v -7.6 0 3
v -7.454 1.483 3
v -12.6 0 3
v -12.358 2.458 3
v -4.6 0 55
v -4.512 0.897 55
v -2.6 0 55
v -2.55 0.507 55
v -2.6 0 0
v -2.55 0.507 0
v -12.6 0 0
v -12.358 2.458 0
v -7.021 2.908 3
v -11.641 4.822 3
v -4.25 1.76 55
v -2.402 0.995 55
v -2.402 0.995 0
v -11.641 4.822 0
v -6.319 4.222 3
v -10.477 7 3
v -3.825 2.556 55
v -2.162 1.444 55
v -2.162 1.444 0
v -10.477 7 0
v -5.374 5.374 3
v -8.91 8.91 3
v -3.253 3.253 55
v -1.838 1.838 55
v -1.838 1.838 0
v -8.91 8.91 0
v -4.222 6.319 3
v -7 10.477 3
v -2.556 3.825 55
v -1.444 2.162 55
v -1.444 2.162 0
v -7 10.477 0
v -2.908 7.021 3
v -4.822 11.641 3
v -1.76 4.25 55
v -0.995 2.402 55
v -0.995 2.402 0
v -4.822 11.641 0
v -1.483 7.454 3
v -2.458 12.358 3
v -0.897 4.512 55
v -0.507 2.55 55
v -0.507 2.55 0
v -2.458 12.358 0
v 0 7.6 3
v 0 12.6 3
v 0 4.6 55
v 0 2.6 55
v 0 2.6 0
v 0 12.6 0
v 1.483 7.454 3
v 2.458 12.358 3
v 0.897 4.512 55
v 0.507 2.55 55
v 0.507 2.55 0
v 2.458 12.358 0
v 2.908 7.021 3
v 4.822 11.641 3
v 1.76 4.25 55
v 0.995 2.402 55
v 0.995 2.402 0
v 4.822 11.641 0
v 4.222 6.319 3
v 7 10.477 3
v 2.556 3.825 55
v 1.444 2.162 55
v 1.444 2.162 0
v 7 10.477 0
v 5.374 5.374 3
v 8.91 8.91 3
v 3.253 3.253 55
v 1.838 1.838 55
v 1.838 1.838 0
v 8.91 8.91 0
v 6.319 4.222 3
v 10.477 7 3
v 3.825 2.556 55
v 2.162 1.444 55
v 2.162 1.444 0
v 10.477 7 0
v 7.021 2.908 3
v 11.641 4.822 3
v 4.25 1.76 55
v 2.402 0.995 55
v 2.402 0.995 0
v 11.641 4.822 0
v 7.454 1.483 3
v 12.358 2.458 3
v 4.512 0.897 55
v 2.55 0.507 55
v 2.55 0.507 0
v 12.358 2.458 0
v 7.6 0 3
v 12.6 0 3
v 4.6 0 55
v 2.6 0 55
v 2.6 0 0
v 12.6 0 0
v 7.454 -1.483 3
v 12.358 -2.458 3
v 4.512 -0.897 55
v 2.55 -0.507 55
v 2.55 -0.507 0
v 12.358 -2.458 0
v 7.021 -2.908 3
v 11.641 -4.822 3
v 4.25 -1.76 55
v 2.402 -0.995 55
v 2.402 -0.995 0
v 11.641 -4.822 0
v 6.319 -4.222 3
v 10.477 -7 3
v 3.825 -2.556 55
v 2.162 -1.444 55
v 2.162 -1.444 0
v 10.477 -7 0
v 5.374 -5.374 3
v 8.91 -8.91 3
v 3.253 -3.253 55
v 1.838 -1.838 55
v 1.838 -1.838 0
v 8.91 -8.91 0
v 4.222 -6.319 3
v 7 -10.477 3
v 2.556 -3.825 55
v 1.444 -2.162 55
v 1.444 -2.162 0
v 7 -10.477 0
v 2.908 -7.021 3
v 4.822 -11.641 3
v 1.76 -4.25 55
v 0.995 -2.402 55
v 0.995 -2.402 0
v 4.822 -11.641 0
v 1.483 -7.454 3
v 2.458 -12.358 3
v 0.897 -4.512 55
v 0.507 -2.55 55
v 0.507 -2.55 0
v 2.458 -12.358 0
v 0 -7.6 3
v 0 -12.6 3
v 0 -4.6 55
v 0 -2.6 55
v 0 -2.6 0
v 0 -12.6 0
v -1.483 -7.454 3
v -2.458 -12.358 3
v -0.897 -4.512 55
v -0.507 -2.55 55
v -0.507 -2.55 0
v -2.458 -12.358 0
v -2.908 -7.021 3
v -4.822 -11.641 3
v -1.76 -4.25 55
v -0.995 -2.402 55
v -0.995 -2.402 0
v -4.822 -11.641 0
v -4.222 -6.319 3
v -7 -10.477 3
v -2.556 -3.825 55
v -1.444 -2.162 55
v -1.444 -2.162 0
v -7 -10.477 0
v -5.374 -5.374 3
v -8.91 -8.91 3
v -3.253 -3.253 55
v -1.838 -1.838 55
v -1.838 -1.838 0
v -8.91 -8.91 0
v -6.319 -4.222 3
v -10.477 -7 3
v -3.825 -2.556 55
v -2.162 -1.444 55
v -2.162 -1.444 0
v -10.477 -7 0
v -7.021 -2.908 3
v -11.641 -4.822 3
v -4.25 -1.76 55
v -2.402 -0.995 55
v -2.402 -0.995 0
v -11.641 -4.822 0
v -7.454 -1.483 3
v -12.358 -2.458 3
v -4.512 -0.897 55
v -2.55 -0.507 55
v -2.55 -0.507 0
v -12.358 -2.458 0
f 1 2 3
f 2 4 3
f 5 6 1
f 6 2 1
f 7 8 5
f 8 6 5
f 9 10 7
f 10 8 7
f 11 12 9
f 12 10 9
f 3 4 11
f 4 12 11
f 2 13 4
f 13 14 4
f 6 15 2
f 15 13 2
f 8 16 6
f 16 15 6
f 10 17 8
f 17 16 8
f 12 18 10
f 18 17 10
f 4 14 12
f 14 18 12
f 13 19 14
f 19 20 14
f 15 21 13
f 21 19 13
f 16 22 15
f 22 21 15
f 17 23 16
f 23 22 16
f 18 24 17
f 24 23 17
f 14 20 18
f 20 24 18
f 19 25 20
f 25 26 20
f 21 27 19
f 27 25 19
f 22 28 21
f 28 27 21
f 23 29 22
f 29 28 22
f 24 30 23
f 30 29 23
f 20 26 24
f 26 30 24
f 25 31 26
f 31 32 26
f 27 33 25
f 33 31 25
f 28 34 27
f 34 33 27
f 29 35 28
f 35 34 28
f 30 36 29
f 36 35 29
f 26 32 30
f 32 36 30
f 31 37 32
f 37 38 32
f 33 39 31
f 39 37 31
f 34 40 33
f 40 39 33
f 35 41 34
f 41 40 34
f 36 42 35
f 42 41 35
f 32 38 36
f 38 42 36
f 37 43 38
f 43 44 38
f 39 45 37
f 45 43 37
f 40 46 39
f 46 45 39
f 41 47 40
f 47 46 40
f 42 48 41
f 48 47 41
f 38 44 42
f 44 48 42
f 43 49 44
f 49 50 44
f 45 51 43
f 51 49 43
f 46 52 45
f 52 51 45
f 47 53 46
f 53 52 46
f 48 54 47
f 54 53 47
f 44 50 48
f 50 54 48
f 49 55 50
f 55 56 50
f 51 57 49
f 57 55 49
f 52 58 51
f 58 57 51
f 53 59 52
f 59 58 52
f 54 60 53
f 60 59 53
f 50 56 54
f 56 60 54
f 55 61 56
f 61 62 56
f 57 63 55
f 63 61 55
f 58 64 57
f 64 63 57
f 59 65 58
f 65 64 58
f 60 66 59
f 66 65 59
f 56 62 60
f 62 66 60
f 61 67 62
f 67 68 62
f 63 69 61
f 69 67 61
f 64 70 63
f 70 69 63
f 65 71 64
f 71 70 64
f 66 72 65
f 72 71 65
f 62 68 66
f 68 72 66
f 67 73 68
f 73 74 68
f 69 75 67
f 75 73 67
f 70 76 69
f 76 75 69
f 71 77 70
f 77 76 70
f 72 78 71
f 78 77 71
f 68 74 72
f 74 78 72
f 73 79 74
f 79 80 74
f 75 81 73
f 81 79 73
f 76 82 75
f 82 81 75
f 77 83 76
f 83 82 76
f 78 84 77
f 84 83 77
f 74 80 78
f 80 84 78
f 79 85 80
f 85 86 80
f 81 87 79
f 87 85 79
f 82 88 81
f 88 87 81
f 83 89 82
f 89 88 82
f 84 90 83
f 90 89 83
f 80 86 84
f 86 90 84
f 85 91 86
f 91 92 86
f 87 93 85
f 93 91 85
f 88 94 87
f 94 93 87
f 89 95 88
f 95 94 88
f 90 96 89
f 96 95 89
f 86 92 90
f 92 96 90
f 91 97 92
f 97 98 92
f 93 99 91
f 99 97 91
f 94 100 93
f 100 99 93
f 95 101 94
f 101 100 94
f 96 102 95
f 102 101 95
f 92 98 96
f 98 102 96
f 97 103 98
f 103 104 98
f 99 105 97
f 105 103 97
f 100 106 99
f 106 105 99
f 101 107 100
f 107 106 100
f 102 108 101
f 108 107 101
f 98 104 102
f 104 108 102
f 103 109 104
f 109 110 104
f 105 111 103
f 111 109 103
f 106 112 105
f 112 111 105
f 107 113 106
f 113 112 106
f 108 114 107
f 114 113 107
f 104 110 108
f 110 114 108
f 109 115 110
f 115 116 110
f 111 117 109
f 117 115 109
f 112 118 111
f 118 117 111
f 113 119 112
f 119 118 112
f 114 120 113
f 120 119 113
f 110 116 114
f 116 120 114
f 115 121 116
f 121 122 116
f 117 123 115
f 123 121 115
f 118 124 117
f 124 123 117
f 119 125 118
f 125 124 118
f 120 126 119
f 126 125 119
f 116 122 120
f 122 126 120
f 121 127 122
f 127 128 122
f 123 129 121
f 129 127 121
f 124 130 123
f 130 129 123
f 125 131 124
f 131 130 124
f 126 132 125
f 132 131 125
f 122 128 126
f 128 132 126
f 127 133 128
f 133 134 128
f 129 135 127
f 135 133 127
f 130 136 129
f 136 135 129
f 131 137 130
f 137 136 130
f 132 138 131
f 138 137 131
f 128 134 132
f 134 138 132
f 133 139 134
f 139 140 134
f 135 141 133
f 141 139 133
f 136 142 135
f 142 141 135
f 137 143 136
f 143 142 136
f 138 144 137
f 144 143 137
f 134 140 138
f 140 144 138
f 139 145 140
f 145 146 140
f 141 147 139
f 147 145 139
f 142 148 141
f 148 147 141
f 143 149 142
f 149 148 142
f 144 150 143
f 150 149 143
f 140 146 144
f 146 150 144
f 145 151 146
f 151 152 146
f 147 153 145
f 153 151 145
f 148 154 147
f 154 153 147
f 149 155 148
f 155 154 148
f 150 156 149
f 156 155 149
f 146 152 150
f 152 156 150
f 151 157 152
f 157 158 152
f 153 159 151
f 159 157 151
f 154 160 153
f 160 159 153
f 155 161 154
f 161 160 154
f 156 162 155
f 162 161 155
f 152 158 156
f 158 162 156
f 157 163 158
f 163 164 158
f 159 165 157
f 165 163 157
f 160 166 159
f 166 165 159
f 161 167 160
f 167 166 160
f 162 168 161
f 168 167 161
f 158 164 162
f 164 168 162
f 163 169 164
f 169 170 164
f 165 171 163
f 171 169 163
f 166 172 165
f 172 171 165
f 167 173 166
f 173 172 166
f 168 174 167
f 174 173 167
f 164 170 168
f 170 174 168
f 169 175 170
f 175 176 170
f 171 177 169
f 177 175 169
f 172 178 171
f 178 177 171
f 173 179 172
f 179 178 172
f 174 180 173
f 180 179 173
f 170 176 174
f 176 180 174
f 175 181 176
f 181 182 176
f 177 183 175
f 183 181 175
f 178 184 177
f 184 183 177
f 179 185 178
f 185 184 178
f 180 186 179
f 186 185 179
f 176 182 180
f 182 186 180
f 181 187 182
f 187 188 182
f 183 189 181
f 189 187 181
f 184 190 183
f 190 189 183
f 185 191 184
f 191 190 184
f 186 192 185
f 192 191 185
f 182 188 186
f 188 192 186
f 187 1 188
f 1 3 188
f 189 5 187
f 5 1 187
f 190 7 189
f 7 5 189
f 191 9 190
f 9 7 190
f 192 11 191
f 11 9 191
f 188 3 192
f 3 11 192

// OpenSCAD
$fn = 32;

// ----------------------------------------------------------------------
// Profiled standoff: conical spacer, 55 mm long, bore 5.2 mm
// ----------------------------------------------------------------------

// --- parameters (mm) ---
revolve_angle = 360;      // full turn around the Z axis
profile_points = 6;       // points of the closed outline

profile = [[2.6, 0], [12.6, 0], [12.6, 3], [7.6, 3], [4.6, 55], [2.6, 55]];  // single closed polygon, 6 points, counter clockwise

// --- the one profile operation ---
rotate_extrude(angle = revolve_angle) polygon(points = profile);
